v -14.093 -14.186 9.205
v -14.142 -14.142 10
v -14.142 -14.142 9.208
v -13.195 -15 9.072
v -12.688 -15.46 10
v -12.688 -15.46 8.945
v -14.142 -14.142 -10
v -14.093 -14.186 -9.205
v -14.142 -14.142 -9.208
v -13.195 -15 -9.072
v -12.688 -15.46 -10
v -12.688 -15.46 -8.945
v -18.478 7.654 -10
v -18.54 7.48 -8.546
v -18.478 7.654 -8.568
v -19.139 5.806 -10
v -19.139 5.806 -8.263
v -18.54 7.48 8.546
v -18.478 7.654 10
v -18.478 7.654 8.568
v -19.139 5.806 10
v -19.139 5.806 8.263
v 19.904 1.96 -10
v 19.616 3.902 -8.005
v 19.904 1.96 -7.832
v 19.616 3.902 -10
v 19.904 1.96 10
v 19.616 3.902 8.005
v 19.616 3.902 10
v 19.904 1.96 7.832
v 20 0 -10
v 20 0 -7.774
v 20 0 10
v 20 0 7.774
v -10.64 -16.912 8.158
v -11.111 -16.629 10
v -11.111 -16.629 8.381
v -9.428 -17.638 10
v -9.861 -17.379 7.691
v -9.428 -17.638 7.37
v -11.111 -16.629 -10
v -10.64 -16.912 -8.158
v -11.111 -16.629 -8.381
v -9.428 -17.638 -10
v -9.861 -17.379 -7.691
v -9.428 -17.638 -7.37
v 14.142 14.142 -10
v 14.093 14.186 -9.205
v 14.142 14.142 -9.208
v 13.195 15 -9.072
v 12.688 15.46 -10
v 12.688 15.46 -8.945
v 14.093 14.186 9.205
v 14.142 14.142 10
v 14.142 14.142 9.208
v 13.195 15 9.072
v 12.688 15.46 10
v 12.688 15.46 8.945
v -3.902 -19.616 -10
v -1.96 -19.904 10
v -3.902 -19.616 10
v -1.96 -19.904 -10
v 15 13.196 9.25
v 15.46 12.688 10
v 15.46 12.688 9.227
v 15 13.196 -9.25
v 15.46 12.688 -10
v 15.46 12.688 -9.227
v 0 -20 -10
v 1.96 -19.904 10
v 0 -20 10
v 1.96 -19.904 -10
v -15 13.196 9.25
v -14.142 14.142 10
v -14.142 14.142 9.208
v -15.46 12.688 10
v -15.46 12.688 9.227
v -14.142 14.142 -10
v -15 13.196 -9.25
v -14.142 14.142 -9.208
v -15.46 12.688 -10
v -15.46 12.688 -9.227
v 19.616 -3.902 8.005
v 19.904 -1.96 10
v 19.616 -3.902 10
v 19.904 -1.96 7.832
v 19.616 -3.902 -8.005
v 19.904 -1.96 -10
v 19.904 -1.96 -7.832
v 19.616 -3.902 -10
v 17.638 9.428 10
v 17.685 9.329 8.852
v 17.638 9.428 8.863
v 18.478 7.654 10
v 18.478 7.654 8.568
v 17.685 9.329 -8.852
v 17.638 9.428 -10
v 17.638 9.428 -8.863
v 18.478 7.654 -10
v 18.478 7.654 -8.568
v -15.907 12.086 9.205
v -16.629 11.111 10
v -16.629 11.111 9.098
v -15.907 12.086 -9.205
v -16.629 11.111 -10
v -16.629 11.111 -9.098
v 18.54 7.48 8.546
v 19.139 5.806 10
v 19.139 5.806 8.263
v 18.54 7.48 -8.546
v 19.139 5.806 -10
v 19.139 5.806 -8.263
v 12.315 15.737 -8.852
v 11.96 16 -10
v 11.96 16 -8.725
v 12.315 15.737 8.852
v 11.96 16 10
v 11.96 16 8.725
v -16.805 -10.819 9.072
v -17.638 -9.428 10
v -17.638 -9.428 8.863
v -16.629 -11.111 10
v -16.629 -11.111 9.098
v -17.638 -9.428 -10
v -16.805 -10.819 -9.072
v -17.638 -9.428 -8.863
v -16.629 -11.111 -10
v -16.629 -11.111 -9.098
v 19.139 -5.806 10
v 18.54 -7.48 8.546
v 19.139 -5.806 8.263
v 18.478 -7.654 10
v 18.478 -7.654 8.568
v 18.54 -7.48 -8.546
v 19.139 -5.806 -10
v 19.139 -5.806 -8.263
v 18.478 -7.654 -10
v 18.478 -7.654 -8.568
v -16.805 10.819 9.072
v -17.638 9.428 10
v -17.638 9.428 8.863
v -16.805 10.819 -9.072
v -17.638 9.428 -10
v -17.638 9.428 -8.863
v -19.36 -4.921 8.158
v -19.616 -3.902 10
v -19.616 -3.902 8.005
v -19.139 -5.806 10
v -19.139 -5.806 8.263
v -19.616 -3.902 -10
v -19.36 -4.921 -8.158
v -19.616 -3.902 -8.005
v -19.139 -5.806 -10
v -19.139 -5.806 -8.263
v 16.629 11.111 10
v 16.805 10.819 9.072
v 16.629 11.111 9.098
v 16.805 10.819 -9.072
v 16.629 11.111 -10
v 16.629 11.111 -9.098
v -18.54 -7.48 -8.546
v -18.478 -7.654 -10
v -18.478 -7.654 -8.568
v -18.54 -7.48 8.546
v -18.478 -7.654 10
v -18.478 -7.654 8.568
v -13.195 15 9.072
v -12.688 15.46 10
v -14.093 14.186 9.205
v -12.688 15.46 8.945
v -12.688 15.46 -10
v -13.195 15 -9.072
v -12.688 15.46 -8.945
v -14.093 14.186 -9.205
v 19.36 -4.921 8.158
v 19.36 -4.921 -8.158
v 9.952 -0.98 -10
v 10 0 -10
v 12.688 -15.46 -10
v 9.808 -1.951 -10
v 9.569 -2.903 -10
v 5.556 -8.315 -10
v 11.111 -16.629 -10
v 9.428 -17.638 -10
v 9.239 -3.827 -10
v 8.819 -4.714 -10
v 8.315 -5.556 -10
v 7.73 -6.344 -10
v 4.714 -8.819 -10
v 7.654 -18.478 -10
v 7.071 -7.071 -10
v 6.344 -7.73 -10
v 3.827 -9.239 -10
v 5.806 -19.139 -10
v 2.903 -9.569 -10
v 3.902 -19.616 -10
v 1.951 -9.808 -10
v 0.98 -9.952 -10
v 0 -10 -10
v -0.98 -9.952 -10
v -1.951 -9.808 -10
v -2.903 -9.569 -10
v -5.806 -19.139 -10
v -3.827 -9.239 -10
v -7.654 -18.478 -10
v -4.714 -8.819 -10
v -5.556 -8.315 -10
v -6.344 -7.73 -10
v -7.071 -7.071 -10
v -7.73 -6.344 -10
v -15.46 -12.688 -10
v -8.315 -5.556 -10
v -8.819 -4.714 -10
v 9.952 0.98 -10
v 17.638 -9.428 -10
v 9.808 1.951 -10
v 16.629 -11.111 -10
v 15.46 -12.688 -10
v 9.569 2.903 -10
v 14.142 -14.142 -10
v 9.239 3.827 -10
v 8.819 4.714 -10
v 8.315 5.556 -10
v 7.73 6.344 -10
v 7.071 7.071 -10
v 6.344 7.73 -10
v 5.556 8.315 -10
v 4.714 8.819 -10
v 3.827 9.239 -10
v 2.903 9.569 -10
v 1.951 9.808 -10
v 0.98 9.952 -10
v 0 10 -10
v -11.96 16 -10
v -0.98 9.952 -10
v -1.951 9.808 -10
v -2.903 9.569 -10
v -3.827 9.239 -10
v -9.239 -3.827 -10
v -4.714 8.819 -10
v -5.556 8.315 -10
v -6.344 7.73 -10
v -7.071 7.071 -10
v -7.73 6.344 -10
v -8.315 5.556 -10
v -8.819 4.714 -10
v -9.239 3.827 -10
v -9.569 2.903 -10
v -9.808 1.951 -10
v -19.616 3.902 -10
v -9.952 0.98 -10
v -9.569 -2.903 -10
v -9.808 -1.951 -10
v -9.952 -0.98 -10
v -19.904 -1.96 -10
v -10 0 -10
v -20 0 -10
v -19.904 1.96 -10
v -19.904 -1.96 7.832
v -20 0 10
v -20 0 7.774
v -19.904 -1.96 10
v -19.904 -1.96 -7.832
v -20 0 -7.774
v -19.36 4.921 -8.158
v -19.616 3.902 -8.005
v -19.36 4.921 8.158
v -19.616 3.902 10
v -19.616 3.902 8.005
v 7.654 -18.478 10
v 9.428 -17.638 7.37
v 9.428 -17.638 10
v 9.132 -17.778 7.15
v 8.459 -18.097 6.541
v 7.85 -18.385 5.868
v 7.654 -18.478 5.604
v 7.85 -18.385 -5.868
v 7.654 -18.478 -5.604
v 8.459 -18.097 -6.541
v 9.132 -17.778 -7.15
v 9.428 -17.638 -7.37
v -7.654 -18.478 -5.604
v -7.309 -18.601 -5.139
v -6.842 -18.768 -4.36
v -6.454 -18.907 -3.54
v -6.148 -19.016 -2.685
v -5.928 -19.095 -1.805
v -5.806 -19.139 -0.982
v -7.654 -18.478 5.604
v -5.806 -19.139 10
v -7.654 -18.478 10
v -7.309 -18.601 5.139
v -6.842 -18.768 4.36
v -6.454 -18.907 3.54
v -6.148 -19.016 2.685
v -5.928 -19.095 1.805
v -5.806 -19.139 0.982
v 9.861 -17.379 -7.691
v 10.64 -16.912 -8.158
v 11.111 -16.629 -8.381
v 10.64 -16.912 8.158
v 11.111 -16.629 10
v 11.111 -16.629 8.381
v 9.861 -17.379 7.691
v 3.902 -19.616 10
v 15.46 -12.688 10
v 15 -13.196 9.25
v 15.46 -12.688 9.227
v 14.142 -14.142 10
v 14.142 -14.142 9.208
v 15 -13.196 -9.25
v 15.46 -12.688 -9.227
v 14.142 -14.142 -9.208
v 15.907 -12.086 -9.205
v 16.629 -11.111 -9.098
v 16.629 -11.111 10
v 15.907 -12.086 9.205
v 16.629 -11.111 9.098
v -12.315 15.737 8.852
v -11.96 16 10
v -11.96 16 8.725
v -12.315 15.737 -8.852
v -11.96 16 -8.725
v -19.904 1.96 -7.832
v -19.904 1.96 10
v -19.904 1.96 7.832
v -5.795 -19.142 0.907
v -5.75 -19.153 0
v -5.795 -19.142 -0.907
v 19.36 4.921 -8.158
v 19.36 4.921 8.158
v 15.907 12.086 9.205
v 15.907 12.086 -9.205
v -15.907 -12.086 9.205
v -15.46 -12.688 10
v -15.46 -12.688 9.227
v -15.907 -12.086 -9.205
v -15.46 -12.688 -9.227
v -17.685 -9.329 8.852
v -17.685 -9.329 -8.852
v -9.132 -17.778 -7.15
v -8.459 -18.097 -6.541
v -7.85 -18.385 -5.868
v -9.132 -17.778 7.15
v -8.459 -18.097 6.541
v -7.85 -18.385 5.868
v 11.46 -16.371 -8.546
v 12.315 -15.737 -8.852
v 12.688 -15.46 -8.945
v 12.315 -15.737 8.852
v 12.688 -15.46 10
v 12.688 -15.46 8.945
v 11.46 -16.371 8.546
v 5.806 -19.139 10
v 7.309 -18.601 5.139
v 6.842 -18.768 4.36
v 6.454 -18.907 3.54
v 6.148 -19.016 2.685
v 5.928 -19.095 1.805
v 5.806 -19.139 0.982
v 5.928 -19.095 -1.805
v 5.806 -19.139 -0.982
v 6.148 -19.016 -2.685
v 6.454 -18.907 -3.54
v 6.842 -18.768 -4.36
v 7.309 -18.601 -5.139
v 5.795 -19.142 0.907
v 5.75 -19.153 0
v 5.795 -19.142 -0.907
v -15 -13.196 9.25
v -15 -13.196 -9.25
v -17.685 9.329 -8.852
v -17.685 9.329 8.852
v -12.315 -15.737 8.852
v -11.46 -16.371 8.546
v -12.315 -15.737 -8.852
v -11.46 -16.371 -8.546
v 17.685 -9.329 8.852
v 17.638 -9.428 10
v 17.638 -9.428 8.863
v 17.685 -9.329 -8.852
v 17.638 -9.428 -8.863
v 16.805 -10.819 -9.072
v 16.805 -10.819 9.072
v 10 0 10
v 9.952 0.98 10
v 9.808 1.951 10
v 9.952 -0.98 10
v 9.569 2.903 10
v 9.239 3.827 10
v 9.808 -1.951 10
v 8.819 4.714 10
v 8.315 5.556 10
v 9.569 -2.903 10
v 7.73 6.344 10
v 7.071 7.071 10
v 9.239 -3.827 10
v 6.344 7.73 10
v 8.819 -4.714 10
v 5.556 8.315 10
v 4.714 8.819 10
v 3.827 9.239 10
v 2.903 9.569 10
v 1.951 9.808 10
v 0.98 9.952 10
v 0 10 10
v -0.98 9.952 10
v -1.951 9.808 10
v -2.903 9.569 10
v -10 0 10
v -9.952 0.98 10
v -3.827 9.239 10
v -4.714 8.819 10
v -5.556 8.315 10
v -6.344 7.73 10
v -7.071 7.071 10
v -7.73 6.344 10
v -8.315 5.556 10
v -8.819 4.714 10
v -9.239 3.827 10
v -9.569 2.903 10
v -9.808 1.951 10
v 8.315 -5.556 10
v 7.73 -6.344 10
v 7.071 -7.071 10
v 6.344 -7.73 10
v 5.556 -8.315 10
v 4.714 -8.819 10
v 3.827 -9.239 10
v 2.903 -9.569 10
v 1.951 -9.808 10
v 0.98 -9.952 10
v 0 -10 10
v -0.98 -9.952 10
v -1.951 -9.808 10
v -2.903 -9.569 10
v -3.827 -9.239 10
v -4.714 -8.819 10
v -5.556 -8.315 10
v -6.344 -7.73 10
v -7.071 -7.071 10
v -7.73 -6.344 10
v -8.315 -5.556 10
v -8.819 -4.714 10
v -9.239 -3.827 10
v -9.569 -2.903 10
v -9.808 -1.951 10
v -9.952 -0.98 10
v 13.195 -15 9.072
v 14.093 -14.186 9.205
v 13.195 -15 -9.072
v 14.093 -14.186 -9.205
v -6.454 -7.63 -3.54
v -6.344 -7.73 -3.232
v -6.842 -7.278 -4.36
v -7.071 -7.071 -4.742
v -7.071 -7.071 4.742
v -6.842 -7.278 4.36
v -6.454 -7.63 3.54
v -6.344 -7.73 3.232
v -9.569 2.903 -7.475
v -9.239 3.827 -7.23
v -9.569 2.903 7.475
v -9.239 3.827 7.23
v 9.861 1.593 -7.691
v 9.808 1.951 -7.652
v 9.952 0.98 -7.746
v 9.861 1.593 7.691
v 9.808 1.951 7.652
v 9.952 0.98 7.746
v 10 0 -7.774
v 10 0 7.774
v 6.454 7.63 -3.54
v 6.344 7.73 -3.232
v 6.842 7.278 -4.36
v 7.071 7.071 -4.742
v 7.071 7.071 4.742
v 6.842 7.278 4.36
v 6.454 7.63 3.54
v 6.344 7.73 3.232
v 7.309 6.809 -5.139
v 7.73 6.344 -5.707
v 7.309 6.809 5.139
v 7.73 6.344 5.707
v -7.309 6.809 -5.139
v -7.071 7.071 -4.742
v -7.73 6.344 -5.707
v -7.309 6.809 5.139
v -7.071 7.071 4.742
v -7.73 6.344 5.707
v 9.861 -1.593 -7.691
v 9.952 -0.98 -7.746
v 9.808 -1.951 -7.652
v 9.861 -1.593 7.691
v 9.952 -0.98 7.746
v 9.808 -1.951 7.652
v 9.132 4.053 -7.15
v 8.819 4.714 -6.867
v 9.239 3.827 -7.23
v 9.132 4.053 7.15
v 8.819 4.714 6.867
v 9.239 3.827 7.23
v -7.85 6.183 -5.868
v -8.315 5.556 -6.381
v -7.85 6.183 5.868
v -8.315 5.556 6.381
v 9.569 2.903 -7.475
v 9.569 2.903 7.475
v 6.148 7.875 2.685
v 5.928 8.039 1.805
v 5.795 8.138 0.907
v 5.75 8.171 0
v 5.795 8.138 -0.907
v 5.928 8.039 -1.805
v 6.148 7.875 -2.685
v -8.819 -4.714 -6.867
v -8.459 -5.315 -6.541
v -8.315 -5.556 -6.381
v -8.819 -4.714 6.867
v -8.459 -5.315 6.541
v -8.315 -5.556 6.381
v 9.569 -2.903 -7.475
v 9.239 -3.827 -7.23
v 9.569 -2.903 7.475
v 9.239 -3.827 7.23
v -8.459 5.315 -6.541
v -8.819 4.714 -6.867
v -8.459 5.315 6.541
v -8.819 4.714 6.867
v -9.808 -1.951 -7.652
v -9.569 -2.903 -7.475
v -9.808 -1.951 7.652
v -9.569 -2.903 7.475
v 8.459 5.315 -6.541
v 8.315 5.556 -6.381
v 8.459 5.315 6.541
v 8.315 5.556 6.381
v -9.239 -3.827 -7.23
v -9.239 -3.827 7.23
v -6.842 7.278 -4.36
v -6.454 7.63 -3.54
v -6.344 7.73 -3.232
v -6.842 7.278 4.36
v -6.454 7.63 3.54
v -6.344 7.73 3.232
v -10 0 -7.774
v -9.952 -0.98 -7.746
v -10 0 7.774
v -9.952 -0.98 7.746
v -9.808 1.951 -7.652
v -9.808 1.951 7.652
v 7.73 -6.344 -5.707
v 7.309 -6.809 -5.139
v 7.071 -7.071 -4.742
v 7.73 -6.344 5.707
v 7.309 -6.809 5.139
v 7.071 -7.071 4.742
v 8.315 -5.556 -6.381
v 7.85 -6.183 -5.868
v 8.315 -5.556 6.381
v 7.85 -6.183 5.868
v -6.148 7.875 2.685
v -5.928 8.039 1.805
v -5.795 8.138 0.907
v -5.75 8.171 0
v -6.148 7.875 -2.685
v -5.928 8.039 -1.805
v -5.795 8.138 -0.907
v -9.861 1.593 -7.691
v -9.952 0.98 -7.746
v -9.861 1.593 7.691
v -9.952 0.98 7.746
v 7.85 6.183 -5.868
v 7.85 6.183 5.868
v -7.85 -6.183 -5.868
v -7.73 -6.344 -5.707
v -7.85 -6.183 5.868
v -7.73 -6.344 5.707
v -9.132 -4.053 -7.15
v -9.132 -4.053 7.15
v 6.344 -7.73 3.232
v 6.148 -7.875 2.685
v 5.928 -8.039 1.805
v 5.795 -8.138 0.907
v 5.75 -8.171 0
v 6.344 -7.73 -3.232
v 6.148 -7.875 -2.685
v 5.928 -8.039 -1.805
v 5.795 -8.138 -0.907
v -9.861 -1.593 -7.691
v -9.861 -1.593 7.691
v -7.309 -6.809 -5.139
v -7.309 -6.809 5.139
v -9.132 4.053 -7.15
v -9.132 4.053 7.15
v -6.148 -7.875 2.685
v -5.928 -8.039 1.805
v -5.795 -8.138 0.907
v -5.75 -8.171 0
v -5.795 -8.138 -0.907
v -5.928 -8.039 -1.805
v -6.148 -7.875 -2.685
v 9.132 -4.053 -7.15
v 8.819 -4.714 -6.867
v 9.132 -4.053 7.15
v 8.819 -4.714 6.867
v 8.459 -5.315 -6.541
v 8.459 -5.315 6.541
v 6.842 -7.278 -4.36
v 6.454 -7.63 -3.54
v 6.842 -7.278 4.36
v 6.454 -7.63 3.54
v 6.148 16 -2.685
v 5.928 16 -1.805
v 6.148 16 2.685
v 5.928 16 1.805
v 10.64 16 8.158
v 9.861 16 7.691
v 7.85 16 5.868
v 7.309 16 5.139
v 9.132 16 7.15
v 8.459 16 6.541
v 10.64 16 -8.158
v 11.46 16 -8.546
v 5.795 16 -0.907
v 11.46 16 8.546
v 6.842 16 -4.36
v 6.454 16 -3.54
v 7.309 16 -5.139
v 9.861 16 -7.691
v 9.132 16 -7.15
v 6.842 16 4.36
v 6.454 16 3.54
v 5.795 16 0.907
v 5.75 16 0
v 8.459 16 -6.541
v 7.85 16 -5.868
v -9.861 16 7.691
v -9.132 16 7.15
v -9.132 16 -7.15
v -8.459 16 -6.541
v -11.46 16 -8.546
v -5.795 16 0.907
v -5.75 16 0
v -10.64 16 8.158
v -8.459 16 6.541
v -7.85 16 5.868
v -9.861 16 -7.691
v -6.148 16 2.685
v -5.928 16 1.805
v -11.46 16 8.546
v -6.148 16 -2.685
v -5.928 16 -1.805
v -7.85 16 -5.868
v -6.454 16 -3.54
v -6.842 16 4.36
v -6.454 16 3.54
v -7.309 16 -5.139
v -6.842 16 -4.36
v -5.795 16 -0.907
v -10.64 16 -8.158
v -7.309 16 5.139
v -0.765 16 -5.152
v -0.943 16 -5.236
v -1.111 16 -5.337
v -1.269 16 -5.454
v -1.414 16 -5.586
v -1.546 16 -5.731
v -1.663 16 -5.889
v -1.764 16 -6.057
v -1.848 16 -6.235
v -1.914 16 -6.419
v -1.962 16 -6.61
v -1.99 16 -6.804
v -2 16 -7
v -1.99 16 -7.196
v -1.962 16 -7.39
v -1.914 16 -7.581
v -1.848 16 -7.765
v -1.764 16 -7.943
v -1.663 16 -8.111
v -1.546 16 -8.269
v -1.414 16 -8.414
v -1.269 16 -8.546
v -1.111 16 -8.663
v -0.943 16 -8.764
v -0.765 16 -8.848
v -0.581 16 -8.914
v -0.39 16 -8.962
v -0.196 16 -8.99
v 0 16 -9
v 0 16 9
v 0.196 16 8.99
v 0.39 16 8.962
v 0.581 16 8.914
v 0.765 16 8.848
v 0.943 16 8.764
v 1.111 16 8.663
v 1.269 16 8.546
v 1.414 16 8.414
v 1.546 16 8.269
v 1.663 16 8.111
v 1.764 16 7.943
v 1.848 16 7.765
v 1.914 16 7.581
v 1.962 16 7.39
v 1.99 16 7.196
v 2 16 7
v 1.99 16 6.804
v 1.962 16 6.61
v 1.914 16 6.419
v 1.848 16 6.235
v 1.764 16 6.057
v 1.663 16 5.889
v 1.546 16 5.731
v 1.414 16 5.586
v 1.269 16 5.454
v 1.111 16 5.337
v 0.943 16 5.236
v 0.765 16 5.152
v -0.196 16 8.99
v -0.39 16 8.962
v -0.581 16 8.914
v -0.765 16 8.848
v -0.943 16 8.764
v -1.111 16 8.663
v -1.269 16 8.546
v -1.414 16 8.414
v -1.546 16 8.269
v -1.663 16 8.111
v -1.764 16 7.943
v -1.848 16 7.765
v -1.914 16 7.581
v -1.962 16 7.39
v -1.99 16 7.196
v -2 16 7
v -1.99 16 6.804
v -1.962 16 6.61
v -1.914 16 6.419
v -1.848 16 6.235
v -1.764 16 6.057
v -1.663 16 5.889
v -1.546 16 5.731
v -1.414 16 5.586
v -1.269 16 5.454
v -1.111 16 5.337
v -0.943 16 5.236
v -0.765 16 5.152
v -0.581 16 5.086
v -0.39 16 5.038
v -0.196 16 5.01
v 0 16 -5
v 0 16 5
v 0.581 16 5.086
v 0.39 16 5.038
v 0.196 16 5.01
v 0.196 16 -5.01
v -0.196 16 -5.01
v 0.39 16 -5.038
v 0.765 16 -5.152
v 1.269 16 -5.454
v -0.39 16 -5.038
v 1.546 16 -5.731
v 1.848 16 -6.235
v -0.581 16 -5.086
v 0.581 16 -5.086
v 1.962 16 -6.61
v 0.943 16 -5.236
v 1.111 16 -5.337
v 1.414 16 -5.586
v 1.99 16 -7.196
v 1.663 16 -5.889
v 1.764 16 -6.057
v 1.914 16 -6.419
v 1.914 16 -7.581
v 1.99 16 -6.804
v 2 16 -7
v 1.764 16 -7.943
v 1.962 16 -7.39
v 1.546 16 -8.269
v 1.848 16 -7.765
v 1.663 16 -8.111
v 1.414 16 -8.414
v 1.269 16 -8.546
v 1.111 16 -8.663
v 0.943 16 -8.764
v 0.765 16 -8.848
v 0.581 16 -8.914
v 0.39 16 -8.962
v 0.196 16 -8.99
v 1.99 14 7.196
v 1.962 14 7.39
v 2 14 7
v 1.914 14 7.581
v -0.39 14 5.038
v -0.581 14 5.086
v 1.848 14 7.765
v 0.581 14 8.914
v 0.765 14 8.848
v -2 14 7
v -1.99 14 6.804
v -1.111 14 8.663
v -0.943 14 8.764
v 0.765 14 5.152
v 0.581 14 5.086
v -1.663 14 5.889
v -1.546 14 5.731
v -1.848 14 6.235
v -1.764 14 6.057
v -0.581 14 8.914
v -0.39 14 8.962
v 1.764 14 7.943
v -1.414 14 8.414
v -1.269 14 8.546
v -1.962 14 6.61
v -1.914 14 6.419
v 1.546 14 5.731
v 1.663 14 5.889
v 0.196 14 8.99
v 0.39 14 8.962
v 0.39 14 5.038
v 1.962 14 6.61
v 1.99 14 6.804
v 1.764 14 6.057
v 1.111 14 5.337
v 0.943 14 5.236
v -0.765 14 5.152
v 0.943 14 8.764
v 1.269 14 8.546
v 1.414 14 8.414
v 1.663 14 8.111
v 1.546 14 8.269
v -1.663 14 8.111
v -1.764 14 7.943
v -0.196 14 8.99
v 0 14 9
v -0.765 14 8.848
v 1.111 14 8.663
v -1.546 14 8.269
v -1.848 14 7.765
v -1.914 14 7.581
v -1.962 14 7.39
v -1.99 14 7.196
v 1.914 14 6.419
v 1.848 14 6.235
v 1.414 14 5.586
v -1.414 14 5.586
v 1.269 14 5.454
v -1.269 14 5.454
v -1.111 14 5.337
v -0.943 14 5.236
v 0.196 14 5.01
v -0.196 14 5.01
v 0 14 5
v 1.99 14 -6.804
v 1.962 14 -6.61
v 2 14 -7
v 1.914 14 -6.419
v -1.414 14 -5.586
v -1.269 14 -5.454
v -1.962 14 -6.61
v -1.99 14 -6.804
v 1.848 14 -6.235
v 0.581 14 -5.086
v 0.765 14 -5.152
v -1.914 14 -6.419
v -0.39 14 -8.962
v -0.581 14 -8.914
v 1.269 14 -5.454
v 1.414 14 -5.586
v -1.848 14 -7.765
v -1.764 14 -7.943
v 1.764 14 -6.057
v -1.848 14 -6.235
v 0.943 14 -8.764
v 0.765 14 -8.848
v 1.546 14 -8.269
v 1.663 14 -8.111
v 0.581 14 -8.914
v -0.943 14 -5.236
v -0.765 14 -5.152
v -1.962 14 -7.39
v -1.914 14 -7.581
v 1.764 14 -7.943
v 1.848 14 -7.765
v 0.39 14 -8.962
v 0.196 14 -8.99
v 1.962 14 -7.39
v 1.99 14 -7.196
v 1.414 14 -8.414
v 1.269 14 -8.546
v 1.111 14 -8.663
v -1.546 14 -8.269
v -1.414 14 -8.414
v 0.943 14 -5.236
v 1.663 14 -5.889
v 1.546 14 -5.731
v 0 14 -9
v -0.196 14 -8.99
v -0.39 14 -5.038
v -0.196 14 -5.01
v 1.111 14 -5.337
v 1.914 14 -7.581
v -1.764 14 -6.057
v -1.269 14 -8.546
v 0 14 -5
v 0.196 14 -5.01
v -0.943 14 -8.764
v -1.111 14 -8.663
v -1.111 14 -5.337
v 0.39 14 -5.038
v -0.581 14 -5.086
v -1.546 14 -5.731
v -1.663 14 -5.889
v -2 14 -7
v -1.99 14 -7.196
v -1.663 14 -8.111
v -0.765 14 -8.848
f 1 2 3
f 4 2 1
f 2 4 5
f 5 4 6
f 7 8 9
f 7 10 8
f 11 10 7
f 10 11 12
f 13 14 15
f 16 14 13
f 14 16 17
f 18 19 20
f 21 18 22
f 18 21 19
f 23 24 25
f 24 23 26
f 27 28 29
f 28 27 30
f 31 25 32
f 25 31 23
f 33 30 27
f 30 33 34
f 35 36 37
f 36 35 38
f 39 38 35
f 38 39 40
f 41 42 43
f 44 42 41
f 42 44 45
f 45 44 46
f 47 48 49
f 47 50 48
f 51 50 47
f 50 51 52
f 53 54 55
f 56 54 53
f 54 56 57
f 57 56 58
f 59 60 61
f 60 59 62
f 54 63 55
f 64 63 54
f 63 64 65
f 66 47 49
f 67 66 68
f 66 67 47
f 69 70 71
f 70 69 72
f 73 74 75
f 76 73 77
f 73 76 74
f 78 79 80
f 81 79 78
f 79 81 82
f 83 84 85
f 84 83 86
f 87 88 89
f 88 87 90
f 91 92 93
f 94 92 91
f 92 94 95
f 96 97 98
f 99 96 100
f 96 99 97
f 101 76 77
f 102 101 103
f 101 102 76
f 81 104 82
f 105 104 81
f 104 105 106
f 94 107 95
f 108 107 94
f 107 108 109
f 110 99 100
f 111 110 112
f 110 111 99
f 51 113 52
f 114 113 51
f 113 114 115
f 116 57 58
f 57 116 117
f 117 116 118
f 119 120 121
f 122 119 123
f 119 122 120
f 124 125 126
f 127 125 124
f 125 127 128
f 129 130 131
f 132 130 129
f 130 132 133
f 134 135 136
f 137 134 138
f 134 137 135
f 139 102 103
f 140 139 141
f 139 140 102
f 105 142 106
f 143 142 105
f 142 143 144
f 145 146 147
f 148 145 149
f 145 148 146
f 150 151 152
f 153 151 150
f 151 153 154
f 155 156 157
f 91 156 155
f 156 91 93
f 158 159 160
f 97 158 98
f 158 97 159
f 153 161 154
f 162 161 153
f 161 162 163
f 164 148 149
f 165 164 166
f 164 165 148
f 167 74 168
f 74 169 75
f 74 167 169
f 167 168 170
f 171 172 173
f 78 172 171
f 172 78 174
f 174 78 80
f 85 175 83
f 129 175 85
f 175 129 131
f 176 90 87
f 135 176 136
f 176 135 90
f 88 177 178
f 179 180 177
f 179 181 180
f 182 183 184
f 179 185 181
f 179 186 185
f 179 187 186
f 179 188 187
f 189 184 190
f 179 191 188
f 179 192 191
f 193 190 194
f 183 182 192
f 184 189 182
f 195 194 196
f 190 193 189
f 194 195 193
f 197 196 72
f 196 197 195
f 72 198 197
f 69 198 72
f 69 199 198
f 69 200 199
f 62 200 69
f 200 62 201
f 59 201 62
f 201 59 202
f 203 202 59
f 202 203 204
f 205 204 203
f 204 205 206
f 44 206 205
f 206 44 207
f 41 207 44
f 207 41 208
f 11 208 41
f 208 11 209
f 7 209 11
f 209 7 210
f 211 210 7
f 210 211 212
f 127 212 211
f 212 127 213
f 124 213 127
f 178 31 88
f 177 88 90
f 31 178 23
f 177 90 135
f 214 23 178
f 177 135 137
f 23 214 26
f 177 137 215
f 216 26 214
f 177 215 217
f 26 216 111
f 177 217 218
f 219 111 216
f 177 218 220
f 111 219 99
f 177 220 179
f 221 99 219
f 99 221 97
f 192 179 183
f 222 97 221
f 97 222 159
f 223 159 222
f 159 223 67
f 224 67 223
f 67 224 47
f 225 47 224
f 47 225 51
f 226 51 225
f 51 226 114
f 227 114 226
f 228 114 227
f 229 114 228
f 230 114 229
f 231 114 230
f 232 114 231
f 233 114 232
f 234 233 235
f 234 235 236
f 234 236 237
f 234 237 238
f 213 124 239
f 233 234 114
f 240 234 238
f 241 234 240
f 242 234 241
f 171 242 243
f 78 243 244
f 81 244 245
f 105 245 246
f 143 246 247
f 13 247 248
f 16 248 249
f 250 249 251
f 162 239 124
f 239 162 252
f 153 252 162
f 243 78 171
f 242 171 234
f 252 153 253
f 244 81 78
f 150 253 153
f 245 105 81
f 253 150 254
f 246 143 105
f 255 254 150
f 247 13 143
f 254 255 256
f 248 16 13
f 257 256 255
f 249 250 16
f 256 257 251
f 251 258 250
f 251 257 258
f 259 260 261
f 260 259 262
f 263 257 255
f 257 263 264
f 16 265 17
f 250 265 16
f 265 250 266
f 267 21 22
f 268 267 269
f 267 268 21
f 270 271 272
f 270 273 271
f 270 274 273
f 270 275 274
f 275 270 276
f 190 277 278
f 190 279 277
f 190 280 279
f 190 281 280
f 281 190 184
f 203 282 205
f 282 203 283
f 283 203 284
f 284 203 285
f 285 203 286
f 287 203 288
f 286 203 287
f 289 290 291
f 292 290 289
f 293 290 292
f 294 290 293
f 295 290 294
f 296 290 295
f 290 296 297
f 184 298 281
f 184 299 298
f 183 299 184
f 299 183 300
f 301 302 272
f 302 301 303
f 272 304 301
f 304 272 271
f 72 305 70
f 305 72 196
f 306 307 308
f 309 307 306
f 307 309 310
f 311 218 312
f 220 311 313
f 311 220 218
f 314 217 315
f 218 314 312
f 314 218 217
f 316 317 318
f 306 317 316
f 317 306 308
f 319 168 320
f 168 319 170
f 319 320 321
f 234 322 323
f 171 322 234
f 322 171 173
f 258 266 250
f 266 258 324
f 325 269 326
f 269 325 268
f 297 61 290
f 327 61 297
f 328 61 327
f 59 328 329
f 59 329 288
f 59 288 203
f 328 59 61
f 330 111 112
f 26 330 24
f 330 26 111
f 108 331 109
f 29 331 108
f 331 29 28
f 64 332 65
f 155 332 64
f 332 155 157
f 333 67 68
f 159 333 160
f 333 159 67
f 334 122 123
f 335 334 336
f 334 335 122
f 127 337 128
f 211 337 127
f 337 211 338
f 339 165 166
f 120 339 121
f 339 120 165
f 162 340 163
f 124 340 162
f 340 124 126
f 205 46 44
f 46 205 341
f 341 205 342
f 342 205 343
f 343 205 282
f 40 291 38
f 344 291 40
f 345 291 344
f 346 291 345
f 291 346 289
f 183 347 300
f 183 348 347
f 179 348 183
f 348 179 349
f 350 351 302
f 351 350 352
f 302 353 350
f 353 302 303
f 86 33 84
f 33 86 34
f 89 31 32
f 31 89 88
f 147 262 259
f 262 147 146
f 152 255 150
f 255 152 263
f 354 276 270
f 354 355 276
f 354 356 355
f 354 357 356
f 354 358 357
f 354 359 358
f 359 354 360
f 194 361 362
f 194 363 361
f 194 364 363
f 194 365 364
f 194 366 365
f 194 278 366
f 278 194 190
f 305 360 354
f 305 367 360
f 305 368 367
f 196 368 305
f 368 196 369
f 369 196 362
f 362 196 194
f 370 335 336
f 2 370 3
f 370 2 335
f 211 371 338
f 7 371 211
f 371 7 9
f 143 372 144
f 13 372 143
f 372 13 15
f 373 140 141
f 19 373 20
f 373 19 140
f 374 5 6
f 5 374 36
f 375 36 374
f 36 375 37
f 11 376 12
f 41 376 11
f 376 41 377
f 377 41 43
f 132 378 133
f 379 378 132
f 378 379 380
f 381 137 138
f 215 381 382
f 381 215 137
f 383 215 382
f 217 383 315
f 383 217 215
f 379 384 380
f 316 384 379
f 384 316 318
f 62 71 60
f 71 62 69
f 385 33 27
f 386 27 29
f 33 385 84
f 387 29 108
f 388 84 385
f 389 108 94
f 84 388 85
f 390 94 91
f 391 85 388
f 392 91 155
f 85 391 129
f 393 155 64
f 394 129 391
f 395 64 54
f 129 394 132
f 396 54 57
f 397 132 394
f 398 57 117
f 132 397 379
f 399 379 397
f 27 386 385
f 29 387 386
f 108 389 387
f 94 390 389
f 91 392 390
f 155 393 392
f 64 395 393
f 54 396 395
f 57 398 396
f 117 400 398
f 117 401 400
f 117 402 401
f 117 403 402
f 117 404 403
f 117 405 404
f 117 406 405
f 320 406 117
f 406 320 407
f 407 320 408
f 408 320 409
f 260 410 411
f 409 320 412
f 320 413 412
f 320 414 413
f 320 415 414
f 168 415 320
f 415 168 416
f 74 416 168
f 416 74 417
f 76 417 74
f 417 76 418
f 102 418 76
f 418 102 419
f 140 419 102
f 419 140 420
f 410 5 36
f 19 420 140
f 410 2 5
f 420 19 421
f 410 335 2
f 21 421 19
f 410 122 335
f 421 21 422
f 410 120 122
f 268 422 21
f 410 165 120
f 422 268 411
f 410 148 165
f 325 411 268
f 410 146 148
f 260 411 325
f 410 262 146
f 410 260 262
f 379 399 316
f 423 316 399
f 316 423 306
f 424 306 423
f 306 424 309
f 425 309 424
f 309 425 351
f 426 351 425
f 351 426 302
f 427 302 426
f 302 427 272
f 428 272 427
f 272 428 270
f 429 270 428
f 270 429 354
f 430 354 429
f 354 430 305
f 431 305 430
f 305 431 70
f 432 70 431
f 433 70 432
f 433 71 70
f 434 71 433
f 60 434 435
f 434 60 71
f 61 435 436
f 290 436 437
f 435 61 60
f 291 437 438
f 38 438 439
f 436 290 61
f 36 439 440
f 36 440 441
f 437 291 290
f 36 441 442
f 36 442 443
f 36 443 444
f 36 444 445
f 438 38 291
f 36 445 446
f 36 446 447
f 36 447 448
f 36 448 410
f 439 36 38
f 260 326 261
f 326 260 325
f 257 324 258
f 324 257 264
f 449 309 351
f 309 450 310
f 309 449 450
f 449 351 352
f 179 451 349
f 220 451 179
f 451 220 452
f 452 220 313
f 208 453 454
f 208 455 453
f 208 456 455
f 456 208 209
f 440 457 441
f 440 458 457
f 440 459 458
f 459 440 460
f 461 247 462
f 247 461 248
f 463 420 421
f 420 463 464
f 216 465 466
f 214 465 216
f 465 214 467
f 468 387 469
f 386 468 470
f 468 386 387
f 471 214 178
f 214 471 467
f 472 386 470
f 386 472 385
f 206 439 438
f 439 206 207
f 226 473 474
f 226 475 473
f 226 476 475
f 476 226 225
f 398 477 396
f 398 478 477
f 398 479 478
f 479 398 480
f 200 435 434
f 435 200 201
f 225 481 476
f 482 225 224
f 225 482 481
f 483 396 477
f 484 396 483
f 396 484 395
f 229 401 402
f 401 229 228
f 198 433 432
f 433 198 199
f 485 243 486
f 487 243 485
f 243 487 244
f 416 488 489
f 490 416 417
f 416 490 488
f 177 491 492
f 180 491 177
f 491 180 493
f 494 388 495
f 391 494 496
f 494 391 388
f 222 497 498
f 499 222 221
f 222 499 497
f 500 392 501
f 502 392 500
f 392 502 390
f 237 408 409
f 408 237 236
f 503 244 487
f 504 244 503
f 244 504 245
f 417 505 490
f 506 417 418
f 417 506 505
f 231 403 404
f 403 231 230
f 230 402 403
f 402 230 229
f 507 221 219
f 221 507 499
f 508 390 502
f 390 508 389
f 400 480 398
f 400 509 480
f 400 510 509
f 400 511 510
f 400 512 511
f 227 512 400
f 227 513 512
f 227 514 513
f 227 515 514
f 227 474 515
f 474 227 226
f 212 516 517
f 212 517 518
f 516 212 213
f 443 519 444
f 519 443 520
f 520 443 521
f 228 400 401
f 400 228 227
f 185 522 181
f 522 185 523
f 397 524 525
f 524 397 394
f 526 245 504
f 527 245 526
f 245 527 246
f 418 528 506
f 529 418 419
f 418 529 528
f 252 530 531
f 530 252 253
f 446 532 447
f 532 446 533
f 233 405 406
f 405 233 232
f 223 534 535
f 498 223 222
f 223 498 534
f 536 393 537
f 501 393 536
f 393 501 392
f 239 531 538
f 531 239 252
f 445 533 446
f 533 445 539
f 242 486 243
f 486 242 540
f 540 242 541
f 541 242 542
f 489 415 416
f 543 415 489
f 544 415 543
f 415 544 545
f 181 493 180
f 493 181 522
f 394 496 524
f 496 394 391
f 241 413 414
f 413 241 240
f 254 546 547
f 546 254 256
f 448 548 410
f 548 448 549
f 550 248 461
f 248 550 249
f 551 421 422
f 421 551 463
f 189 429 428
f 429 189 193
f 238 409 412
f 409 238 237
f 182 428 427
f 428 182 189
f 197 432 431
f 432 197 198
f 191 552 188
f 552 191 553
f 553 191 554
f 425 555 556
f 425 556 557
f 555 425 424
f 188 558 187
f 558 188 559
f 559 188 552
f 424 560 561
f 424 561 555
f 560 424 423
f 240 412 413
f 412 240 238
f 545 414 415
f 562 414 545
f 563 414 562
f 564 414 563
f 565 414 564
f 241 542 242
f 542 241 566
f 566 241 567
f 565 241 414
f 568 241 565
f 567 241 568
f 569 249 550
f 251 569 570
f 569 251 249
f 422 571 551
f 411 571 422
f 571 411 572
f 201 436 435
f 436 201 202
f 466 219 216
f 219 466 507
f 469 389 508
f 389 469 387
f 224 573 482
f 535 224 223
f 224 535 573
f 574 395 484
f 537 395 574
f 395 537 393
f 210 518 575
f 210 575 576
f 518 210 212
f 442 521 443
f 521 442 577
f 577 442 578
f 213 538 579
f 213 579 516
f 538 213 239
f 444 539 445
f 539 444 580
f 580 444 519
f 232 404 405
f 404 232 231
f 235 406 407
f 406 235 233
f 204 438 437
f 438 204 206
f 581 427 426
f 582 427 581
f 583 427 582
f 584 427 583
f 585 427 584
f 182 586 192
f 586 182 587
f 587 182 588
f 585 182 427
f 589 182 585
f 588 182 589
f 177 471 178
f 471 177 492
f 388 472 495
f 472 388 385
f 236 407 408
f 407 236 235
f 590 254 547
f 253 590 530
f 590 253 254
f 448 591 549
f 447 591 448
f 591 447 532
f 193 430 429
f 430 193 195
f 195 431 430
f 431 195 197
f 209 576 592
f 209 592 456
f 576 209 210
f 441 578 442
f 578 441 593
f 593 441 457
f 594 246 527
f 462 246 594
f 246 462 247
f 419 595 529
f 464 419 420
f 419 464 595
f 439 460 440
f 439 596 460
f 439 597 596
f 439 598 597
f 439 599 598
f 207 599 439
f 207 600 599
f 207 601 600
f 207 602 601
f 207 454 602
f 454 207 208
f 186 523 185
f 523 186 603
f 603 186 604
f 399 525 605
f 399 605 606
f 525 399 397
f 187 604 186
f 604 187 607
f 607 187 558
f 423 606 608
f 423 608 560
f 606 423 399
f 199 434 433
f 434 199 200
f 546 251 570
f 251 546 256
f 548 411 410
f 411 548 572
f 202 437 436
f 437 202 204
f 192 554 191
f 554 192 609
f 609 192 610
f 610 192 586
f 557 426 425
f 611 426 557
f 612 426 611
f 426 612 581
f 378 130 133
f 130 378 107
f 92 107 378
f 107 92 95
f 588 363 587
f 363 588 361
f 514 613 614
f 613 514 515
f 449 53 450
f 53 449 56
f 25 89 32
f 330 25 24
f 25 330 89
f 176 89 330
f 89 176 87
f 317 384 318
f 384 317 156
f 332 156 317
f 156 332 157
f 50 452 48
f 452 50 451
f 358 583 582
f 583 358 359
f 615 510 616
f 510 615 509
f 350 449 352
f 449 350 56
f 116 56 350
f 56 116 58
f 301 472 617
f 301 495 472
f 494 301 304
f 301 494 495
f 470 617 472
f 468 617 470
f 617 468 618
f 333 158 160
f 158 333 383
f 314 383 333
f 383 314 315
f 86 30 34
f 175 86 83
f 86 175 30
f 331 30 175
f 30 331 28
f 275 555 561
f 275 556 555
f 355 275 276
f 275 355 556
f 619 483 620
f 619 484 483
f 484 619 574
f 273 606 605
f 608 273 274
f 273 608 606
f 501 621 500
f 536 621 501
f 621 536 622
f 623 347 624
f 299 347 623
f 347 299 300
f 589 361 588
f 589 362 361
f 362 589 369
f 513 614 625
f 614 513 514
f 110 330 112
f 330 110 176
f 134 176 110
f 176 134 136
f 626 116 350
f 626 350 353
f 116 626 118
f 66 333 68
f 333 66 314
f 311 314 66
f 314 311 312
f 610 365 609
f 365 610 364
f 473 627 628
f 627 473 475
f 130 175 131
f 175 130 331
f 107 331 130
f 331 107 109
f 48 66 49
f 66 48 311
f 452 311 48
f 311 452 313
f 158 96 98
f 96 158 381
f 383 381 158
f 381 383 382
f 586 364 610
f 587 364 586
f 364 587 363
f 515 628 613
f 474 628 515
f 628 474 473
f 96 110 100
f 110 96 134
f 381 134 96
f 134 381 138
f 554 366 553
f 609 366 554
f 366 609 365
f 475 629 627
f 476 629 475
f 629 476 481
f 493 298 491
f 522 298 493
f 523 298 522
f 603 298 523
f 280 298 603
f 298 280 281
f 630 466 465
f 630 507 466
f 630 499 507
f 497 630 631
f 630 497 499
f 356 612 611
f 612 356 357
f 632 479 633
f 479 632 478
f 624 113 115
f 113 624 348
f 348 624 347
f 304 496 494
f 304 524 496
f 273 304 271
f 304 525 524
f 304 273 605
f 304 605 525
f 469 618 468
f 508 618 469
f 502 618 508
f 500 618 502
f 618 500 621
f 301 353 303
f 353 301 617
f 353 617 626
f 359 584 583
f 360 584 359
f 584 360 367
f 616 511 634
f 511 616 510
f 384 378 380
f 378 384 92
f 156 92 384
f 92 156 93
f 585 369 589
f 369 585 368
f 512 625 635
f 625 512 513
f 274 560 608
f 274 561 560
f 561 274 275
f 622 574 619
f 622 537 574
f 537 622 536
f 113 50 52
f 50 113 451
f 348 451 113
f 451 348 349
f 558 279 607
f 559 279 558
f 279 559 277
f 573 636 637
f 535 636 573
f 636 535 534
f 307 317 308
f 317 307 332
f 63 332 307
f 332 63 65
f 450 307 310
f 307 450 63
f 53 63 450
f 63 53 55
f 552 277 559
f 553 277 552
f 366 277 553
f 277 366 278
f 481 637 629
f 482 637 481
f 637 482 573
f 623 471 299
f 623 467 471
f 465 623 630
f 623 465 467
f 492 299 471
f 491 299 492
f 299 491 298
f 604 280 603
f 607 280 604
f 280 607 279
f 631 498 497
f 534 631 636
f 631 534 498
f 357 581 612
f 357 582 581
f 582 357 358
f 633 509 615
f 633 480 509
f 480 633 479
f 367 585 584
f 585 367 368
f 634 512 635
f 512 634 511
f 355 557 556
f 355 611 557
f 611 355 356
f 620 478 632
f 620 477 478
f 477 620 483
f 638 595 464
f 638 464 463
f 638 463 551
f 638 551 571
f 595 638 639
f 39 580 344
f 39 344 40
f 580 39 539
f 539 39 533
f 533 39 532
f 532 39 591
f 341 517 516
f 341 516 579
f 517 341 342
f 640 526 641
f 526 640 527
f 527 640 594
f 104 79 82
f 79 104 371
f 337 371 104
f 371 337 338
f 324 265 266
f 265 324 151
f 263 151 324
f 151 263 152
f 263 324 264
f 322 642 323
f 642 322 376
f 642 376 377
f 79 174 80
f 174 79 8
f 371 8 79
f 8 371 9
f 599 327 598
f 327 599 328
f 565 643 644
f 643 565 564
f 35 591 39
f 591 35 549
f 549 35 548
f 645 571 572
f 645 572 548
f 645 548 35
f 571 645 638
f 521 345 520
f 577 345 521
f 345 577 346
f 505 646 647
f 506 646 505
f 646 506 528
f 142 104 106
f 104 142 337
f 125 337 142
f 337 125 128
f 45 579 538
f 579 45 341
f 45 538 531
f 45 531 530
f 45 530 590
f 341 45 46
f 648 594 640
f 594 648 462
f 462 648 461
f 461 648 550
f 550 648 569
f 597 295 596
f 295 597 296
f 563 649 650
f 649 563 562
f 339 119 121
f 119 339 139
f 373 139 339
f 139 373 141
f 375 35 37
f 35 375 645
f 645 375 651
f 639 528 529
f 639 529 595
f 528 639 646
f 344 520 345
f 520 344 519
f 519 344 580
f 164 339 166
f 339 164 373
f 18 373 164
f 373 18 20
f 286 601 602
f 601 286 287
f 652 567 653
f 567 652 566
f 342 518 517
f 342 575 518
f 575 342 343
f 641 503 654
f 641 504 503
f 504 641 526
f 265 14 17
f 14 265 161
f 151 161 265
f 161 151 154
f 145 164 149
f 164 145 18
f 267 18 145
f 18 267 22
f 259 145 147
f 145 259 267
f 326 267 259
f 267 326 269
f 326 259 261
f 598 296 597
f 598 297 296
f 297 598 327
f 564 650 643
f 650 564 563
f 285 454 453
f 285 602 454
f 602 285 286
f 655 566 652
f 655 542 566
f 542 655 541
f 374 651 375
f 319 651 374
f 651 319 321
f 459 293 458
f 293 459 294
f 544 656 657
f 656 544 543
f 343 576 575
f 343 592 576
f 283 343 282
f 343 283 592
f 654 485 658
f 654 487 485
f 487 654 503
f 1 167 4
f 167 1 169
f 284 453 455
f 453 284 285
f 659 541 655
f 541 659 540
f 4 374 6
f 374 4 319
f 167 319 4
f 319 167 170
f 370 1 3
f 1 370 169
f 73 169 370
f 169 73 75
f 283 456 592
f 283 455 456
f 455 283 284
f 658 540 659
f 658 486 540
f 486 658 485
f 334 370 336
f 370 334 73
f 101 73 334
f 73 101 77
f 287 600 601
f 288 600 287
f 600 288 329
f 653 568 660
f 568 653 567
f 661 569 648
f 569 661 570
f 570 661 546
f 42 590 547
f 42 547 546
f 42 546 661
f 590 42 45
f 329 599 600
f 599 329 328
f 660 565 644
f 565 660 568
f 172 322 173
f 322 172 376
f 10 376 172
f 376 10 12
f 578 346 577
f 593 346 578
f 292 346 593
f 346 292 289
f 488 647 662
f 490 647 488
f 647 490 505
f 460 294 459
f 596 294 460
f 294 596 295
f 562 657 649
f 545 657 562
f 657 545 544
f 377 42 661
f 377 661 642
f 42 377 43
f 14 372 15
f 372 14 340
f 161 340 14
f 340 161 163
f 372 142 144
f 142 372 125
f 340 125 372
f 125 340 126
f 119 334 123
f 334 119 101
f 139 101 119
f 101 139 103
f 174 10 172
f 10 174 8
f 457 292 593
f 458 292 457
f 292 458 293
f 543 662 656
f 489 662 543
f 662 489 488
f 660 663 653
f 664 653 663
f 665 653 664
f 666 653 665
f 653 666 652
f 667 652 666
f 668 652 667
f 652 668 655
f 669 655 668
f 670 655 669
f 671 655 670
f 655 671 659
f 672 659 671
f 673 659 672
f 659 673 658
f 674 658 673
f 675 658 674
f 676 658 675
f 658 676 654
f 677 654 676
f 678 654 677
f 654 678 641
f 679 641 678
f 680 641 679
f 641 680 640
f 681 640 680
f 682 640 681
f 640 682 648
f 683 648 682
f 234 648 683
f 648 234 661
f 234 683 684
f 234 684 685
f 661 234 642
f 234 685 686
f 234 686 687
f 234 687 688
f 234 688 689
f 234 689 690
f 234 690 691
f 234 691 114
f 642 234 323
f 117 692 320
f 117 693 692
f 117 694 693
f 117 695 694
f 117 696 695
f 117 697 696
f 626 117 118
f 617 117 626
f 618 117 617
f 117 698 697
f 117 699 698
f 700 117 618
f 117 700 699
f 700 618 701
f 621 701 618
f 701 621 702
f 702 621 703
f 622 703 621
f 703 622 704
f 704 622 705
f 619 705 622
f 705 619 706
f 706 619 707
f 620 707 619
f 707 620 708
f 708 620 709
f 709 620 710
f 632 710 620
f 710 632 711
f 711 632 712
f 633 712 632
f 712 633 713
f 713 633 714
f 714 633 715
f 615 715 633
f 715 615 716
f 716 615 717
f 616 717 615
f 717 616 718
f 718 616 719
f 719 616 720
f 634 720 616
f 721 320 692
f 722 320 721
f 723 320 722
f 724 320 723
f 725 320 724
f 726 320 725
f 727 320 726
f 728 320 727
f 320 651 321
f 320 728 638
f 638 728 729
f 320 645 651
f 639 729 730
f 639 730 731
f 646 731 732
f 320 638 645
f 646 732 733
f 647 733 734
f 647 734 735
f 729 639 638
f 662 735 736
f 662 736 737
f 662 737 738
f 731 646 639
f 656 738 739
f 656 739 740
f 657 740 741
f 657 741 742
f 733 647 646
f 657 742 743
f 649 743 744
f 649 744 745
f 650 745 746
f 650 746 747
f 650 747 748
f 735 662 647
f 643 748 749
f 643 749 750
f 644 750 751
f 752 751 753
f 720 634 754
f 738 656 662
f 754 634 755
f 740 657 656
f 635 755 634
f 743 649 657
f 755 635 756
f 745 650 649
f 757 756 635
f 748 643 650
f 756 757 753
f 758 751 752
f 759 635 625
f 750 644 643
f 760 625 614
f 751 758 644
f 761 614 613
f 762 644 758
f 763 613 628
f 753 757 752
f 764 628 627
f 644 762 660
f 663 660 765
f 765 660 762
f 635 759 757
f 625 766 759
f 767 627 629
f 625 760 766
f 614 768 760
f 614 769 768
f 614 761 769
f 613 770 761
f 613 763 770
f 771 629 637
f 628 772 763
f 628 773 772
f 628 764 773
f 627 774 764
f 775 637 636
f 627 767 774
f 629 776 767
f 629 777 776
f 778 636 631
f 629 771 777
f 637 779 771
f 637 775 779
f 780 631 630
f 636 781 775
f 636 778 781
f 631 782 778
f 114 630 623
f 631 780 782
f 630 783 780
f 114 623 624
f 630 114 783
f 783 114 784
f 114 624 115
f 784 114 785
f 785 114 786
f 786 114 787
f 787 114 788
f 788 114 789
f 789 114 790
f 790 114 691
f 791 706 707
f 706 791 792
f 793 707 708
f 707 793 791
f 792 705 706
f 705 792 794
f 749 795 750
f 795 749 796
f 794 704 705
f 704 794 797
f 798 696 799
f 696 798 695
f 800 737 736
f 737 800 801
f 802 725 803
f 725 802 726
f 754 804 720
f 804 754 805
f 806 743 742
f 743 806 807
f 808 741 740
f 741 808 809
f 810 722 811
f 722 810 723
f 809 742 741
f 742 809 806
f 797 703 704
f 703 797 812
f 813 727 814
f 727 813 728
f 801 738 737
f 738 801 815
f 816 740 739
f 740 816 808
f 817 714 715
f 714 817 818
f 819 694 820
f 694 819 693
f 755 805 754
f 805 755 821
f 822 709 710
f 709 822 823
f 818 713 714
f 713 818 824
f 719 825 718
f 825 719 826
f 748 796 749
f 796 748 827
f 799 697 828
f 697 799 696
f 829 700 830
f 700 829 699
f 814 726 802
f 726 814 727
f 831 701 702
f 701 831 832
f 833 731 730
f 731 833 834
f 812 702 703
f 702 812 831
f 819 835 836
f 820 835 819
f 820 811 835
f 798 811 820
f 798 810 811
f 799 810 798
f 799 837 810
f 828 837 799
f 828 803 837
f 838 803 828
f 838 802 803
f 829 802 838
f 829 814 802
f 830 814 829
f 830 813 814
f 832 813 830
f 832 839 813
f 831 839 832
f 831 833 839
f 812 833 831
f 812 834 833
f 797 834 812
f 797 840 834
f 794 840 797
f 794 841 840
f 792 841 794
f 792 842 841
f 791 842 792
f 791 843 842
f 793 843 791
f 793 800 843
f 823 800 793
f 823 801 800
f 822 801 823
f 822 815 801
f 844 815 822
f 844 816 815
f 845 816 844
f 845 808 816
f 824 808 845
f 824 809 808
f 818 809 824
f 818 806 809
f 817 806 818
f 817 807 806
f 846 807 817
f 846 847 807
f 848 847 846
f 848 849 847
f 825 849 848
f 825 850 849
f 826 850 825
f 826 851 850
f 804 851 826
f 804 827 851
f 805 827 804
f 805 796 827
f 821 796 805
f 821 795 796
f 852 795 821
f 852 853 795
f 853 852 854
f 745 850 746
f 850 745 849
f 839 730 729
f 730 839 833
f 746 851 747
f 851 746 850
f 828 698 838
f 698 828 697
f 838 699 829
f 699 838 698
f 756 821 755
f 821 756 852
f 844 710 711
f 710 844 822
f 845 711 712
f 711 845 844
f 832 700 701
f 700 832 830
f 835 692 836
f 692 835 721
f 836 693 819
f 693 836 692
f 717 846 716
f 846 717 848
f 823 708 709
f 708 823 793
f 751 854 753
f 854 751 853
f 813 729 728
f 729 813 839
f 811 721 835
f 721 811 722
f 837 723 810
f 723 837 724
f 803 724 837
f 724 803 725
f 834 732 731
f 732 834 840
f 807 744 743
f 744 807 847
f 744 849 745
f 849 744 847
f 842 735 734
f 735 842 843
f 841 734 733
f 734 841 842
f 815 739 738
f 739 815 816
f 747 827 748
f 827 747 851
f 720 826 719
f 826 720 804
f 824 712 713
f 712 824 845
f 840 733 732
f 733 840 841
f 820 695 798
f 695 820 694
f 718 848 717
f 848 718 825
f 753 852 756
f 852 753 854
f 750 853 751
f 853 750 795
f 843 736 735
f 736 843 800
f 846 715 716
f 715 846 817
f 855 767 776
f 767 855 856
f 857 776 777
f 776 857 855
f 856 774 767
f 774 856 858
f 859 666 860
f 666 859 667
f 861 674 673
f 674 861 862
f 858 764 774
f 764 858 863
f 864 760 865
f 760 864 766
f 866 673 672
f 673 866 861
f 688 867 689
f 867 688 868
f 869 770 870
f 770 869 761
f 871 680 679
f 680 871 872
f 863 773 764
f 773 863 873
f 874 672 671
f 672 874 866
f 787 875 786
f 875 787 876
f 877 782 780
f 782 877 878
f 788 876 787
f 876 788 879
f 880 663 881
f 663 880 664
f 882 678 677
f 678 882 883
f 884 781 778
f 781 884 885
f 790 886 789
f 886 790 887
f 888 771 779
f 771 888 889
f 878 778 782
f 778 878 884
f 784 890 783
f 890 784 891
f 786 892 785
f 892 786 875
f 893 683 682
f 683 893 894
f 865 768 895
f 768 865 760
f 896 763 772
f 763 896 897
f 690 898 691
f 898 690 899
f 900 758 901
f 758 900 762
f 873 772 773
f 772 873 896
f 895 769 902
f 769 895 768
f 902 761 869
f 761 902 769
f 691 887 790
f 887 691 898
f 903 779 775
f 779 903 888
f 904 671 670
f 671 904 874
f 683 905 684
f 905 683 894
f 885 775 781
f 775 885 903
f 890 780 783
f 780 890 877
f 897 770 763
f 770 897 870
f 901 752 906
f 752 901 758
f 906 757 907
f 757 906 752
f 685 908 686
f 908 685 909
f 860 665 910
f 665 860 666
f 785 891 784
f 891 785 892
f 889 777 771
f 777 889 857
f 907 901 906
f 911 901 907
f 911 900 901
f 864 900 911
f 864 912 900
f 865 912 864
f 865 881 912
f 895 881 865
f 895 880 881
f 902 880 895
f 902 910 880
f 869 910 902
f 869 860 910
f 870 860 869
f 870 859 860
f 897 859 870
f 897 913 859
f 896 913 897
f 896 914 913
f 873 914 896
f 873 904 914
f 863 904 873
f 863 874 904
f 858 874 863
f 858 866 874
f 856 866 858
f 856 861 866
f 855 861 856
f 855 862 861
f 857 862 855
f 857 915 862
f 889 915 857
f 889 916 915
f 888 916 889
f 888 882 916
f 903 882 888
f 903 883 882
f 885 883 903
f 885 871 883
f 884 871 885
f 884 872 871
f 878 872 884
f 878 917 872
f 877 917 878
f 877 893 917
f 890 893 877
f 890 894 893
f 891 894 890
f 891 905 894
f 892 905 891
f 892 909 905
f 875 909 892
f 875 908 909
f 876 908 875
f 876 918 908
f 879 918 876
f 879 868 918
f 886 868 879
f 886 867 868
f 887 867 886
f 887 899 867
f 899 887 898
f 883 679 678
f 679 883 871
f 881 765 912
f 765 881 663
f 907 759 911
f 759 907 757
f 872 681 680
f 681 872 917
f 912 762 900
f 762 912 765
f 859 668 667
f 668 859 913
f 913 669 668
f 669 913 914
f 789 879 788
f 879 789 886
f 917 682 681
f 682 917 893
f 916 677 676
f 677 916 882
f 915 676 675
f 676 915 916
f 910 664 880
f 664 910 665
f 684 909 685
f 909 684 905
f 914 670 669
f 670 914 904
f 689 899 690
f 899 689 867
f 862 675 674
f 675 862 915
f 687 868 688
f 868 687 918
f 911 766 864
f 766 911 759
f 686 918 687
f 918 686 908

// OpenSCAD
// COBRA Vertebra - T6 V12
// Height: 20.0mm, OD: 40.0mm

$fn = 64;

difference() {
    // Outer cylinder
    cylinder(h=20.0, d=40.0, center=true);
    
    // Inner channel
    cylinder(h=22.0, d=20.0, center=true);

    // Battery cavity 1
    rotate([0, 0, 0])
    translate([15.0, 0, 0])
    rotate([90, 0, 0])
    cylinder(h=74.0, d=18.5, center=true);

    // Battery cavity 2
    rotate([0, 0, 180])
    translate([15.0, 0, 0])
    rotate([90, 0, 0])
    cylinder(h=74.0, d=18.5, center=true);

    // Solar panel cavity
    translate([0, 18.0, 0])
    cube([50, 4, 30], center=true);

    // Pivot holes
    translate([0, 20.0, 7.0])
    rotate([90, 0, 0])
    cylinder(h=12.0, d=4, center=true);
    
    translate([0, 20.0, -7.0])
    rotate([90, 0, 0])
    cylinder(h=12.0, d=4, center=true);
}
